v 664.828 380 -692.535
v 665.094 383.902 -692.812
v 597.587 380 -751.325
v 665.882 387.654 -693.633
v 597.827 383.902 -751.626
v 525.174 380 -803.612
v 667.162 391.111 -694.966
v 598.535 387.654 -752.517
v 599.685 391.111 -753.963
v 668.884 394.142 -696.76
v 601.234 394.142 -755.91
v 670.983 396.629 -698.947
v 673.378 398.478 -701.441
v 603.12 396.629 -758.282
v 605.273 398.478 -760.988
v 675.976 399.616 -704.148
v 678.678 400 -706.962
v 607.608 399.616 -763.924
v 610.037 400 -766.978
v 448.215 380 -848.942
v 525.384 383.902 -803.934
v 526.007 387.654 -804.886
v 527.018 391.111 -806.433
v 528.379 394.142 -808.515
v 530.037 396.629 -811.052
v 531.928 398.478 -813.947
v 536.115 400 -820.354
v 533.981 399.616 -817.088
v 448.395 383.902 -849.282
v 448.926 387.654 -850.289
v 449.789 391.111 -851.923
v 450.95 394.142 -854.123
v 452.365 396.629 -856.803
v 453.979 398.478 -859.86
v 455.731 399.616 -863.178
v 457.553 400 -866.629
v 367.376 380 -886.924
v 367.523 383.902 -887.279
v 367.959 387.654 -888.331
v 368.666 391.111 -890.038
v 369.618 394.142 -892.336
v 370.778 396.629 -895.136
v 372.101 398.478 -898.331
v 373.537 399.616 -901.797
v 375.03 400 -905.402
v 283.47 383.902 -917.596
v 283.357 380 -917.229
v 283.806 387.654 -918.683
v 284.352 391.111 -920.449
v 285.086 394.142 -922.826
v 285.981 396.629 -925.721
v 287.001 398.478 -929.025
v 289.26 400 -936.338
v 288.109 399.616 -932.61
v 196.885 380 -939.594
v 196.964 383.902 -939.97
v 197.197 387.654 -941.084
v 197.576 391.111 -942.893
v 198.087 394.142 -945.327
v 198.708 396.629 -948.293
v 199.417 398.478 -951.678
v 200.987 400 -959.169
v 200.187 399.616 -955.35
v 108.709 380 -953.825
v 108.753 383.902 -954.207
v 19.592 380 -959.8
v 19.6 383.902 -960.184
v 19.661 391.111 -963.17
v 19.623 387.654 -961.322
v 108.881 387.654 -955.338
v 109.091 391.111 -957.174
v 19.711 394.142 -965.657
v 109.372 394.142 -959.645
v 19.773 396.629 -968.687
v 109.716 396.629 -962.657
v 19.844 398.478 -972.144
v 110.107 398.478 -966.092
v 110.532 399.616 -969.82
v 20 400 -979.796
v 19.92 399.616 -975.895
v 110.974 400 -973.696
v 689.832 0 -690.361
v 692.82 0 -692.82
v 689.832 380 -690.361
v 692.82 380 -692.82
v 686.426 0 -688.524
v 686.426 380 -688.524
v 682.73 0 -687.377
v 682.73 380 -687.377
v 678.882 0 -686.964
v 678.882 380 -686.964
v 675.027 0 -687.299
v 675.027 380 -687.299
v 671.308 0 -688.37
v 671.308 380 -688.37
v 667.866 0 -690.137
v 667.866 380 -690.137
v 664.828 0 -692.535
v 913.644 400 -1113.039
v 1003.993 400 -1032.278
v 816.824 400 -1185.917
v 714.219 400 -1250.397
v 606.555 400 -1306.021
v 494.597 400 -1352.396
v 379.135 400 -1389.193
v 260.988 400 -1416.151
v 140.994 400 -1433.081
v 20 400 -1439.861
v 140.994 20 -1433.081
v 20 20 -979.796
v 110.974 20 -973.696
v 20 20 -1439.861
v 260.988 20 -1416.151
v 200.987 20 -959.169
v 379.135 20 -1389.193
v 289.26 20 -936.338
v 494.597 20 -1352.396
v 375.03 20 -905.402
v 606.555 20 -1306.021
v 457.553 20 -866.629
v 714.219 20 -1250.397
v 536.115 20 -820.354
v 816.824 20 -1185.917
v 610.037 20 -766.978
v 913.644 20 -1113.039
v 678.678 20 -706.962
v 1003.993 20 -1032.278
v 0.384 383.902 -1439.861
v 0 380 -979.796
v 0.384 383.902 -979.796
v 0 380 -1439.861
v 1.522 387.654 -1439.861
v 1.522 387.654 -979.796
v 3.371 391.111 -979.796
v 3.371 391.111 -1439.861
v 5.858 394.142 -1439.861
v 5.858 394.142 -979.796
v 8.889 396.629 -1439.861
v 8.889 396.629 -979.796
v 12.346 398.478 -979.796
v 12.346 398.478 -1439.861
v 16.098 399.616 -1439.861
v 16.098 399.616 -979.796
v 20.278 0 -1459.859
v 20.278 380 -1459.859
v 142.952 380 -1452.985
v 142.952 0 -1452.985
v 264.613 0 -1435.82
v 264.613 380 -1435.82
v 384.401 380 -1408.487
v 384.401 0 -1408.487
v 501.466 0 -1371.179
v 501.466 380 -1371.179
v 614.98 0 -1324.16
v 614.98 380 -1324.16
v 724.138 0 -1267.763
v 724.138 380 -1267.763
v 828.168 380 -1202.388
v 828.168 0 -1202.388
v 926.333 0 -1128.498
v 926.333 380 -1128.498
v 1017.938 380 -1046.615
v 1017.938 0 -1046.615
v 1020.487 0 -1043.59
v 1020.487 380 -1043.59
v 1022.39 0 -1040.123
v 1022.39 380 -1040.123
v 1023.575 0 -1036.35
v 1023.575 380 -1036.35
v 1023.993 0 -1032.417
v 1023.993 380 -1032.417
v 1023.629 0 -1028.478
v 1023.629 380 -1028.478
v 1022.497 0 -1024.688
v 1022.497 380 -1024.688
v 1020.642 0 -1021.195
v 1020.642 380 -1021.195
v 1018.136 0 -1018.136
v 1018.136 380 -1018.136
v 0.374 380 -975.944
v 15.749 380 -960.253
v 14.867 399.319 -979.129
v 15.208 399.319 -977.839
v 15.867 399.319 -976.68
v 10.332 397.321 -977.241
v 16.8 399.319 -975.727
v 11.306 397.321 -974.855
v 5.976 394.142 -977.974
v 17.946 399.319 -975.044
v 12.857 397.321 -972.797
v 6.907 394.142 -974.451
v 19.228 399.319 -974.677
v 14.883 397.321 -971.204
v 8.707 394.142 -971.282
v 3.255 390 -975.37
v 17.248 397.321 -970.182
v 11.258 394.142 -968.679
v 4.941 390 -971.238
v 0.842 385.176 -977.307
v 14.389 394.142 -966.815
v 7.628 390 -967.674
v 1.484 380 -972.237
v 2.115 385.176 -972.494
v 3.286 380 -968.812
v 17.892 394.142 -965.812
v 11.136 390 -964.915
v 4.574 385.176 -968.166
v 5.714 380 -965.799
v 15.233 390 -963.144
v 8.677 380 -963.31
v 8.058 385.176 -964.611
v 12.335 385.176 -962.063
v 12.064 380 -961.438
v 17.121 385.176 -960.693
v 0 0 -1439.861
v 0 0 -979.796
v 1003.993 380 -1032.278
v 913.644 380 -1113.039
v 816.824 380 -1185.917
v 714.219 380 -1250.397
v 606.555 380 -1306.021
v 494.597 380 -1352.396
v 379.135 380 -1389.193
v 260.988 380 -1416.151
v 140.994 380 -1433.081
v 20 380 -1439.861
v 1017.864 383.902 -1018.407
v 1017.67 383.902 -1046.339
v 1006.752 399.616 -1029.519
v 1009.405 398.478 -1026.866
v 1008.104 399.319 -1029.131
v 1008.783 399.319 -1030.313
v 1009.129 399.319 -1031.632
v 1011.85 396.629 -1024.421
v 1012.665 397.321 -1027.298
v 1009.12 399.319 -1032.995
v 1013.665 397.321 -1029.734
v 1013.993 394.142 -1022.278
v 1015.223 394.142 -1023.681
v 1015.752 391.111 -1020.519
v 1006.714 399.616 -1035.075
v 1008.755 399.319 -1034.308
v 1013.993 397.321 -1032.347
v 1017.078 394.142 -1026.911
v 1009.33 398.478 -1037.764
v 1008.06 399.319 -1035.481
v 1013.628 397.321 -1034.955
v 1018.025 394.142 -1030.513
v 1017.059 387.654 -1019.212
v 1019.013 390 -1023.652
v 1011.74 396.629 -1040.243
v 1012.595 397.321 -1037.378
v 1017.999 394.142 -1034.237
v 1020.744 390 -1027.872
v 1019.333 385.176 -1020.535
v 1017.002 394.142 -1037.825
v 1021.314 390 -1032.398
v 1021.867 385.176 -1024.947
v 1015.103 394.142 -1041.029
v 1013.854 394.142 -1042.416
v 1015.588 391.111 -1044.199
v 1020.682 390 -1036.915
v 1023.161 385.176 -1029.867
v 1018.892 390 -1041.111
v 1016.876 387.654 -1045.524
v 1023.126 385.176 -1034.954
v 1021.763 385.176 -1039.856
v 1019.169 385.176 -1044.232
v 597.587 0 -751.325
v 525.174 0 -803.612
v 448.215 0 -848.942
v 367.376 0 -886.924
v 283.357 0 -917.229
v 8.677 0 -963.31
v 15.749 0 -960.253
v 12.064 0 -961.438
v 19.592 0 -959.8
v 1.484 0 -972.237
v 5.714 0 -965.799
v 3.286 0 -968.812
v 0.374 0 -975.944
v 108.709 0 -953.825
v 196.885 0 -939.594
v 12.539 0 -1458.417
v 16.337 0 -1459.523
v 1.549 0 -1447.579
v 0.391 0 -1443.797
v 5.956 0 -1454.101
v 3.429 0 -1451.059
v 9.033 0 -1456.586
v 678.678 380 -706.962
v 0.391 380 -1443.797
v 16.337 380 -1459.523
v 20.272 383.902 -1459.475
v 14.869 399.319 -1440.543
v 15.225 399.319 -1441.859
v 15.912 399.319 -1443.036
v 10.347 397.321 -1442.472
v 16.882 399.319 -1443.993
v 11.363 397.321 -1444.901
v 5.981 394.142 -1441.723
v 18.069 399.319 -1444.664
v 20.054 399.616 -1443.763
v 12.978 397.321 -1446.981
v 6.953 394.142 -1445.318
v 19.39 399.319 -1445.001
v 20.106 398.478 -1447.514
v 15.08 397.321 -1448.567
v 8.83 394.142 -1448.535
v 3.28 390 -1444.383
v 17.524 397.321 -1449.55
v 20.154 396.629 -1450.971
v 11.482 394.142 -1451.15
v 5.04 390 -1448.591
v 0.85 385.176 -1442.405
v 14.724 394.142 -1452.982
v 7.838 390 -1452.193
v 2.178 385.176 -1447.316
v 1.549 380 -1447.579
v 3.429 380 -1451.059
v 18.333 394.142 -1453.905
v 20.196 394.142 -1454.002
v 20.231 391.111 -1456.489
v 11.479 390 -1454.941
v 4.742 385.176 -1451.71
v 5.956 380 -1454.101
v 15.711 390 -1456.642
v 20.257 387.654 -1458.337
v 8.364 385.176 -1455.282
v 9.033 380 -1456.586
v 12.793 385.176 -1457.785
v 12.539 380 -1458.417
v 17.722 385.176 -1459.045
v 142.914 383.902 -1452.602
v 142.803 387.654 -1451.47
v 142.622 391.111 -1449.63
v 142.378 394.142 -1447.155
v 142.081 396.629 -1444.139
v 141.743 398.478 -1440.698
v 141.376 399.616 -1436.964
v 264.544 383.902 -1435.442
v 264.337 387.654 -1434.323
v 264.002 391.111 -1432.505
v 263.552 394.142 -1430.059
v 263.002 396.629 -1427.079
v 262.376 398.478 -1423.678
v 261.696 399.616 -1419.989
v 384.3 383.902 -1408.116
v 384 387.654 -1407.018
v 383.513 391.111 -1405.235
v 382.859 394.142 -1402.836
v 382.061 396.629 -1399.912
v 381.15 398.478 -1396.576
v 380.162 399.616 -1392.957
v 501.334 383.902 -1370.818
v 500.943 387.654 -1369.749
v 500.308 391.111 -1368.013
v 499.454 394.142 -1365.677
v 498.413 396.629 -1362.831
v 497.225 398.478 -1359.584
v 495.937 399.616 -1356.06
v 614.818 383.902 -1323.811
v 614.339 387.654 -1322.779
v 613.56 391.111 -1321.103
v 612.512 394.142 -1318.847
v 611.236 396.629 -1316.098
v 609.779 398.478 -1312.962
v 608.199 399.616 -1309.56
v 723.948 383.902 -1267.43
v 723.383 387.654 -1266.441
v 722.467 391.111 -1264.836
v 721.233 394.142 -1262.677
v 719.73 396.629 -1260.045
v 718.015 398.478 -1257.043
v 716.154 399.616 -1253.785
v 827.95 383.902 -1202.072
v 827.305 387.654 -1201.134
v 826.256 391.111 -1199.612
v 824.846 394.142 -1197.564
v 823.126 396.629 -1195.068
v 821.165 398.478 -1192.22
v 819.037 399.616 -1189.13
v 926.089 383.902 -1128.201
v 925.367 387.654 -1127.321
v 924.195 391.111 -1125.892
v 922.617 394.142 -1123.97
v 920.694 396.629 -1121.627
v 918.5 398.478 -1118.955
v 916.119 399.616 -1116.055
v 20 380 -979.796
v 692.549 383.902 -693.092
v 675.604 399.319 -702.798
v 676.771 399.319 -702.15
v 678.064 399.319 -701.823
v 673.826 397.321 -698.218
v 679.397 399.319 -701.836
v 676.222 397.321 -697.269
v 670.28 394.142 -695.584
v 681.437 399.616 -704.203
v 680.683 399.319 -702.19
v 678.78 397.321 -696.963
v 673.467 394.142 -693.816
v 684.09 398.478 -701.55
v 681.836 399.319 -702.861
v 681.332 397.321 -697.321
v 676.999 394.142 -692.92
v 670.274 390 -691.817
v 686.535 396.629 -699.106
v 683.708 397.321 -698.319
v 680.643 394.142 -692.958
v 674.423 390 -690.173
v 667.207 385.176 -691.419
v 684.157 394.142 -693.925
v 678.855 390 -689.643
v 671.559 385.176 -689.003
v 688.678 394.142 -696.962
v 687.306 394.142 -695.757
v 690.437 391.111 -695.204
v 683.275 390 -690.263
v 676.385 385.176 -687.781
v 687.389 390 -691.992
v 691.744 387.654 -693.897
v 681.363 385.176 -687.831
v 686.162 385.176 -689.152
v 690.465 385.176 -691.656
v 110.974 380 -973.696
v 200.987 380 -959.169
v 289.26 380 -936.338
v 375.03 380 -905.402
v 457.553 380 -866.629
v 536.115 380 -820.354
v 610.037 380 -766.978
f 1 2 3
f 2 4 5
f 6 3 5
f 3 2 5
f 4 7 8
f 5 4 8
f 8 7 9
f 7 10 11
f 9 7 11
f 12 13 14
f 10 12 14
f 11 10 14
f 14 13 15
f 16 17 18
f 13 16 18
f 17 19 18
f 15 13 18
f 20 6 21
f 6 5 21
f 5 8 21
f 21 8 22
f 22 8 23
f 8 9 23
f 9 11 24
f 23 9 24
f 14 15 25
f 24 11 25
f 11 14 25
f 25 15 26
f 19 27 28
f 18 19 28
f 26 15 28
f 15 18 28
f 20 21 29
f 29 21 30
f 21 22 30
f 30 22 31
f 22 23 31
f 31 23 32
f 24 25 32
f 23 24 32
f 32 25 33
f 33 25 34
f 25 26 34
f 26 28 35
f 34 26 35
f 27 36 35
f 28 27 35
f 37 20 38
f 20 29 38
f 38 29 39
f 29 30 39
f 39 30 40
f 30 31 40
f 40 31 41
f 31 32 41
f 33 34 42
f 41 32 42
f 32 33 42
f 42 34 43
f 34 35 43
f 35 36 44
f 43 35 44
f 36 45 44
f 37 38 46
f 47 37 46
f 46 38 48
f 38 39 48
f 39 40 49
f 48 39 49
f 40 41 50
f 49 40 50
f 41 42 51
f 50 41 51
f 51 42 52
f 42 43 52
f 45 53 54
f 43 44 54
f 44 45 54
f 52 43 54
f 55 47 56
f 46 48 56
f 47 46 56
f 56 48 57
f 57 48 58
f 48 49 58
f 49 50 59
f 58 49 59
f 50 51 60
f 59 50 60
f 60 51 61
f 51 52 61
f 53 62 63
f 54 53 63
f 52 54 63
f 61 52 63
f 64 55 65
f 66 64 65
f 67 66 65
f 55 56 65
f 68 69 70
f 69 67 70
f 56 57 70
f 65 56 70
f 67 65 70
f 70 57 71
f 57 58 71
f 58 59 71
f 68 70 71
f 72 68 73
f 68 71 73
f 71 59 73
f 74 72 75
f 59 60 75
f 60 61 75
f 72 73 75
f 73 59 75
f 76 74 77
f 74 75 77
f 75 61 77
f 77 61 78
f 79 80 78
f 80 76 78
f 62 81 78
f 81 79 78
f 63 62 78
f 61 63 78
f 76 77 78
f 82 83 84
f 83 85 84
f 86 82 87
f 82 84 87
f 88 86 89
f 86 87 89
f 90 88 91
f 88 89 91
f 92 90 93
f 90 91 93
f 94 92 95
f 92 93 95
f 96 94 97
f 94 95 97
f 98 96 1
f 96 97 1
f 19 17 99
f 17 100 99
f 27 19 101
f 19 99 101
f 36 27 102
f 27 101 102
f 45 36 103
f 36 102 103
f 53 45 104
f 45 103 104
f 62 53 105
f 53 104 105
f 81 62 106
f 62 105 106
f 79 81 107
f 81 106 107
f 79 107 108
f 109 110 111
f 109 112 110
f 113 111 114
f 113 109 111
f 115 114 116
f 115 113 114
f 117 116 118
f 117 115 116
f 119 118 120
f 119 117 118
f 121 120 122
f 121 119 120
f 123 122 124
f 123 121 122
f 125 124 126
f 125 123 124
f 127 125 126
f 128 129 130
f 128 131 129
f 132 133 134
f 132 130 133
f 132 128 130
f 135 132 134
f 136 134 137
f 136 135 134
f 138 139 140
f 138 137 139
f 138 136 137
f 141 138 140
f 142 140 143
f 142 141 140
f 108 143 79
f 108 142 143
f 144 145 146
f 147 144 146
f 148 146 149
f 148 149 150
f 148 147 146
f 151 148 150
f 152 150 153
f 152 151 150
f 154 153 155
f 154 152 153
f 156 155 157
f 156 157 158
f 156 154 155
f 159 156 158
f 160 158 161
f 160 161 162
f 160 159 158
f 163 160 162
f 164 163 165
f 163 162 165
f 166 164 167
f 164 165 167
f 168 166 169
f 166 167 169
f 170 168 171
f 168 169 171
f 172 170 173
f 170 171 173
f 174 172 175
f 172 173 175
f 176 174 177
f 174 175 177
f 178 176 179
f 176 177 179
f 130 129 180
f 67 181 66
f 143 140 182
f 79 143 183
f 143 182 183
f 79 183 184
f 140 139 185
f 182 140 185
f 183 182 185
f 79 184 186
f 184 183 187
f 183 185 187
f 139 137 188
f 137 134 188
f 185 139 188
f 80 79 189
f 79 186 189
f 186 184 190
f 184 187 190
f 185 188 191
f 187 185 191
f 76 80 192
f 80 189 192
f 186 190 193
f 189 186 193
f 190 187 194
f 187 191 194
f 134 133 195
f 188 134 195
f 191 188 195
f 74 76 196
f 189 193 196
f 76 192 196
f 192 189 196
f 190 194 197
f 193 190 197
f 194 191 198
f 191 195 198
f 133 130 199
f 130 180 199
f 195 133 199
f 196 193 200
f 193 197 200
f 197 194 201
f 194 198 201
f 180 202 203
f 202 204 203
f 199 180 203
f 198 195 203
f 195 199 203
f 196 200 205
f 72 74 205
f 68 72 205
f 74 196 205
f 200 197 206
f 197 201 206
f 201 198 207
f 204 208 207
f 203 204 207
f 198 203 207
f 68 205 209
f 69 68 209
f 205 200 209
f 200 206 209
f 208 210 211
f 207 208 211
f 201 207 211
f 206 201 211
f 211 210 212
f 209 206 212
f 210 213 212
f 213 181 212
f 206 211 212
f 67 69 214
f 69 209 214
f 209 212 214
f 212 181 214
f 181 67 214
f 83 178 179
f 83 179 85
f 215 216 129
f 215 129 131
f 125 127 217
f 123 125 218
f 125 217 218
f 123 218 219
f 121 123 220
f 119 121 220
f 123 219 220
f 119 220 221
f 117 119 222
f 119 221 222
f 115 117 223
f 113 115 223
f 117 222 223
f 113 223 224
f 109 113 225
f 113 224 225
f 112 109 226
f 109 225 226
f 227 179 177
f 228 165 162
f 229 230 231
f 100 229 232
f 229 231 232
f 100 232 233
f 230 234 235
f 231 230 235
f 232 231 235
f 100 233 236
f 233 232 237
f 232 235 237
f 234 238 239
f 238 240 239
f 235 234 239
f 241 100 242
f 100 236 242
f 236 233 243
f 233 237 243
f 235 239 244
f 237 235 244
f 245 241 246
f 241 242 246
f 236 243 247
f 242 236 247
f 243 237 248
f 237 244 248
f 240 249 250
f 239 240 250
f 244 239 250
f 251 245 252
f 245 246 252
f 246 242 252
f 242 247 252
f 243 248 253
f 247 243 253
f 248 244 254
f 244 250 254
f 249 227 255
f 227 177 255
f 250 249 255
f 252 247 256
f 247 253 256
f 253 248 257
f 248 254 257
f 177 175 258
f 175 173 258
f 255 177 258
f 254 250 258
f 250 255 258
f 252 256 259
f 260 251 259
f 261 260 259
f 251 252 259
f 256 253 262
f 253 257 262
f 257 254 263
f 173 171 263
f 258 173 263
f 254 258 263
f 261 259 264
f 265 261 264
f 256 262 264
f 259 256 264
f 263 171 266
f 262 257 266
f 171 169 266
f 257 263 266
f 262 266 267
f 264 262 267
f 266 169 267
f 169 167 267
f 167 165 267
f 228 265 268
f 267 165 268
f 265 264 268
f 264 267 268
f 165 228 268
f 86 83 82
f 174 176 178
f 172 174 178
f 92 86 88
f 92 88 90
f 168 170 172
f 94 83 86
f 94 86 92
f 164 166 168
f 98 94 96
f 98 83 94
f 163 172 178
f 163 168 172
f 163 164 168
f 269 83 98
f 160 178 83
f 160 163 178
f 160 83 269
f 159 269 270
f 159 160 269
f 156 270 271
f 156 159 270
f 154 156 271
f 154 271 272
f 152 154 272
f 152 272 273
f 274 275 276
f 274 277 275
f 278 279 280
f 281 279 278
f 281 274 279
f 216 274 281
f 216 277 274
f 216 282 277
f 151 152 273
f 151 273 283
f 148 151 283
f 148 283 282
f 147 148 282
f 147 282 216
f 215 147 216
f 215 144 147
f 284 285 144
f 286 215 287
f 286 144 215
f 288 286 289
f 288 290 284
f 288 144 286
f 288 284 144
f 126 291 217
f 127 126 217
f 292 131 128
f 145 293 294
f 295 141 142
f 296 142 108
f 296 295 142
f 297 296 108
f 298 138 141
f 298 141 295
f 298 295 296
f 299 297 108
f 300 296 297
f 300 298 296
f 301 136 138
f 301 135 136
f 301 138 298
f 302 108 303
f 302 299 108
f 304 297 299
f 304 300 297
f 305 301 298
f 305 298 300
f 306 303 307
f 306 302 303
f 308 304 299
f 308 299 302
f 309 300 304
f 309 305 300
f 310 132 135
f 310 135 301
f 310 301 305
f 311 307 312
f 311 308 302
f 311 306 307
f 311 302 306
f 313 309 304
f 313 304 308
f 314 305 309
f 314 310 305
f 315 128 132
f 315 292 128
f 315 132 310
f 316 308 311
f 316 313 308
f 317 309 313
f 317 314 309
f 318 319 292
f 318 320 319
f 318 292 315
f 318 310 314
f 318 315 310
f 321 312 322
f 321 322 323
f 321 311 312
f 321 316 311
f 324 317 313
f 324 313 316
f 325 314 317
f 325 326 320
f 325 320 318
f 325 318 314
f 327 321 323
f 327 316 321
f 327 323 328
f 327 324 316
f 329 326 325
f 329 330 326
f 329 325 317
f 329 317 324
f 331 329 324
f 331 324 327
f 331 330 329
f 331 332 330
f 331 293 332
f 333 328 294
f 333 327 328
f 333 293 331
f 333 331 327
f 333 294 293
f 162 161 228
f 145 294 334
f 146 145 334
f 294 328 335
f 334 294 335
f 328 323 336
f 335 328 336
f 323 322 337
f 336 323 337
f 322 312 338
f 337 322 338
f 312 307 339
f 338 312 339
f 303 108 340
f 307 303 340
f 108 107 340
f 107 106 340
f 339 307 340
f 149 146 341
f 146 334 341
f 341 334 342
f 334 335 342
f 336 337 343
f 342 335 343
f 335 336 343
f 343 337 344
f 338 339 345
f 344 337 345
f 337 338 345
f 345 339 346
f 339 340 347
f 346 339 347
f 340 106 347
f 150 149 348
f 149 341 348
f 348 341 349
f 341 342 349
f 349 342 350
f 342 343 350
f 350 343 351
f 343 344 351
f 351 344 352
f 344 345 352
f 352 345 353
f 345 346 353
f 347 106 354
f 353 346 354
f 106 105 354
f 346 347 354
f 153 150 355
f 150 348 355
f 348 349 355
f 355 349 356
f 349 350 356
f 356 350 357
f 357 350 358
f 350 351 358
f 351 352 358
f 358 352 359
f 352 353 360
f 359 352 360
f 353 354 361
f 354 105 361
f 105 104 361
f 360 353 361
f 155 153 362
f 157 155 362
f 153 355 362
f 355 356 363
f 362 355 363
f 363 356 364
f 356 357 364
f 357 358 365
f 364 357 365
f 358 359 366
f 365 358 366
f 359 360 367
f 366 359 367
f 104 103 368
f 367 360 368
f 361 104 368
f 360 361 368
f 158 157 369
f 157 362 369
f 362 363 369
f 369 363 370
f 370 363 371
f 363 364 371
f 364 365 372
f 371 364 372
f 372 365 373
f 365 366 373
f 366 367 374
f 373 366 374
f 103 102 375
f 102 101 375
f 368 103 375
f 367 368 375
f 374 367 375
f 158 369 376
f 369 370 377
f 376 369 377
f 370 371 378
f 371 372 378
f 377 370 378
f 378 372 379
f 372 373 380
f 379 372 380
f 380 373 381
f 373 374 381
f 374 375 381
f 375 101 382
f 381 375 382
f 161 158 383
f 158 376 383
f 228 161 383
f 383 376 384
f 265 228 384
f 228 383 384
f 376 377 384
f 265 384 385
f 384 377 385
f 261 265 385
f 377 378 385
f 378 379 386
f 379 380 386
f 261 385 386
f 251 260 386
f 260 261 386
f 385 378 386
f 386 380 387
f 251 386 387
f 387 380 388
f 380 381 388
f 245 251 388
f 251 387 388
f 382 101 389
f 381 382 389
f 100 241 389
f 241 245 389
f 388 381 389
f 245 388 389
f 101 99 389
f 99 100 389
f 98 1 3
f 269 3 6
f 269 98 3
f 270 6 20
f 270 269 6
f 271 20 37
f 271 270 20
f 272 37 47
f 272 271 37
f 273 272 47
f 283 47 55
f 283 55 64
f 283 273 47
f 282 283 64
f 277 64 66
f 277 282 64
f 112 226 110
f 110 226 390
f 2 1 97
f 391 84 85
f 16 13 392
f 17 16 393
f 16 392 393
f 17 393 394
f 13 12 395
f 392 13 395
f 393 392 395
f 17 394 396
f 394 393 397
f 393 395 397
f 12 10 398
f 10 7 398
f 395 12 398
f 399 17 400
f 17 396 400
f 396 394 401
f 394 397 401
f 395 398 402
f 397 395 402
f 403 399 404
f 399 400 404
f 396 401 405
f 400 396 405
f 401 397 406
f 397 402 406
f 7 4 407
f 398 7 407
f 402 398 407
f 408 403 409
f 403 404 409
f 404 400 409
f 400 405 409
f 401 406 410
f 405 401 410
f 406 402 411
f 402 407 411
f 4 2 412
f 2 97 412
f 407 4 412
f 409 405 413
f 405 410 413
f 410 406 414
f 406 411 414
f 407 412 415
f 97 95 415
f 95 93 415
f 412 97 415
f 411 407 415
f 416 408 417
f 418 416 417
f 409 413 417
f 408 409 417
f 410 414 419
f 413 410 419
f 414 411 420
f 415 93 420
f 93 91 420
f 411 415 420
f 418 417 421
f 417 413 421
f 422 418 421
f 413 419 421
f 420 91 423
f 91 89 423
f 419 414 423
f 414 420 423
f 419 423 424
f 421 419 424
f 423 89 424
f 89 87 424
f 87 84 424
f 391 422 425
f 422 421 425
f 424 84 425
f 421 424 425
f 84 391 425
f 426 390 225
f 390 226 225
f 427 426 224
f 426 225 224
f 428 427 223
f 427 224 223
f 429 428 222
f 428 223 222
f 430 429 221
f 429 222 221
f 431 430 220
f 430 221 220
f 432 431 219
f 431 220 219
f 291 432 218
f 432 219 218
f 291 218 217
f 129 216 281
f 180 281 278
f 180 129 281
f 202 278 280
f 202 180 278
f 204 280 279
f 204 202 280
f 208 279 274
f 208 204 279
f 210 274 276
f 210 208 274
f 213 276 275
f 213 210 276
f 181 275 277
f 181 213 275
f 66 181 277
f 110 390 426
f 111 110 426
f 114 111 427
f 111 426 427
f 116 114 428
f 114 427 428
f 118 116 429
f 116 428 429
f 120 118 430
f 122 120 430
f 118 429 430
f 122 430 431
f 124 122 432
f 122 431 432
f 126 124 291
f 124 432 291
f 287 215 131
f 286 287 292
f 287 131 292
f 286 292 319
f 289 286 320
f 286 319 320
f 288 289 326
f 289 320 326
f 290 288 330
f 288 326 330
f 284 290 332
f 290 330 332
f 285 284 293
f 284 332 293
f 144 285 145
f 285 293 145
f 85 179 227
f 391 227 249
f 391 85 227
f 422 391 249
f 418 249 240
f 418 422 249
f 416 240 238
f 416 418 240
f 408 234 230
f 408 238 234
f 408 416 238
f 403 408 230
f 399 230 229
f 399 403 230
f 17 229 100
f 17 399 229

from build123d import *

# Parameters (mm, degrees)
BOSS_EXTRUDE1_DEPTH = 400
FILLET1_R           = 20
CUT_EXTRUDE1_START  = -20
CUT_EXTRUDE1_DEPTH  = 360


with BuildPart() as part:
    # Sketch1 → Boss-Extrude1 (new body)
    with BuildSketch(Plane(origin=(0, 0, 0), x_dir=(1, 0, 0), z_dir=(0, 1, 0))):
        with BuildLine():
            Line((0, 960), (0, 1460))
            ThreePointArc((0, 1460), (558.717811253, 1348.864117466), (1032.375900532, 1032.375900532))
            Line((1032.375900532, 1032.375900532), (678.822509939, 678.822509939))
            ThreePointArc((678.822509939, 678.822509939), (367.37609507, 886.924351211), (0, 960))
        make_face()
    extrude(amount=BOSS_EXTRUDE1_DEPTH)

    # Fillet1
    fillet1_edges = [part.edges().sort_by_distance(p)[0] for p in [
        (367.37609507, 400, -886.924351211),
        (855.599205236, 400, -855.599205236),
        (558.717811253, 400, -1348.864117466),
        (1032.375900532, 200, -1032.375900532),
        (678.822509939, 200, -678.822509939),
        (0, 200, -960),
        (0, 200, -1460),
        (0, 400, -1210),
    ]]
    fillet(fillet1_edges, radius=FILLET1_R)

    # Sketch4 → Cut-Extrude1 (cut)
    with BuildSketch(Plane(origin=(0, 400, 0), x_dir=(1, 0, 0), z_dir=(0, 1, 0)).offset(CUT_EXTRUDE1_START)):
        with BuildLine():
            ThreePointArc((20, 979.795897113), (375.029763718, 905.401941861), (678.678187404, 706.962458651))
            Line((678.678187404, 706.962458651), (1003.993415273, 1032.277686521))
            ThreePointArc((1003.993415273, 1032.277686521), (551.064142606, 1330.386526816), (20, 1439.861104413))
            Line((20, 1439.861104413), (20, 979.795897113))
        make_face()
    extrude(amount=-CUT_EXTRUDE1_DEPTH, mode=Mode.SUBTRACT)


solid = part.part
